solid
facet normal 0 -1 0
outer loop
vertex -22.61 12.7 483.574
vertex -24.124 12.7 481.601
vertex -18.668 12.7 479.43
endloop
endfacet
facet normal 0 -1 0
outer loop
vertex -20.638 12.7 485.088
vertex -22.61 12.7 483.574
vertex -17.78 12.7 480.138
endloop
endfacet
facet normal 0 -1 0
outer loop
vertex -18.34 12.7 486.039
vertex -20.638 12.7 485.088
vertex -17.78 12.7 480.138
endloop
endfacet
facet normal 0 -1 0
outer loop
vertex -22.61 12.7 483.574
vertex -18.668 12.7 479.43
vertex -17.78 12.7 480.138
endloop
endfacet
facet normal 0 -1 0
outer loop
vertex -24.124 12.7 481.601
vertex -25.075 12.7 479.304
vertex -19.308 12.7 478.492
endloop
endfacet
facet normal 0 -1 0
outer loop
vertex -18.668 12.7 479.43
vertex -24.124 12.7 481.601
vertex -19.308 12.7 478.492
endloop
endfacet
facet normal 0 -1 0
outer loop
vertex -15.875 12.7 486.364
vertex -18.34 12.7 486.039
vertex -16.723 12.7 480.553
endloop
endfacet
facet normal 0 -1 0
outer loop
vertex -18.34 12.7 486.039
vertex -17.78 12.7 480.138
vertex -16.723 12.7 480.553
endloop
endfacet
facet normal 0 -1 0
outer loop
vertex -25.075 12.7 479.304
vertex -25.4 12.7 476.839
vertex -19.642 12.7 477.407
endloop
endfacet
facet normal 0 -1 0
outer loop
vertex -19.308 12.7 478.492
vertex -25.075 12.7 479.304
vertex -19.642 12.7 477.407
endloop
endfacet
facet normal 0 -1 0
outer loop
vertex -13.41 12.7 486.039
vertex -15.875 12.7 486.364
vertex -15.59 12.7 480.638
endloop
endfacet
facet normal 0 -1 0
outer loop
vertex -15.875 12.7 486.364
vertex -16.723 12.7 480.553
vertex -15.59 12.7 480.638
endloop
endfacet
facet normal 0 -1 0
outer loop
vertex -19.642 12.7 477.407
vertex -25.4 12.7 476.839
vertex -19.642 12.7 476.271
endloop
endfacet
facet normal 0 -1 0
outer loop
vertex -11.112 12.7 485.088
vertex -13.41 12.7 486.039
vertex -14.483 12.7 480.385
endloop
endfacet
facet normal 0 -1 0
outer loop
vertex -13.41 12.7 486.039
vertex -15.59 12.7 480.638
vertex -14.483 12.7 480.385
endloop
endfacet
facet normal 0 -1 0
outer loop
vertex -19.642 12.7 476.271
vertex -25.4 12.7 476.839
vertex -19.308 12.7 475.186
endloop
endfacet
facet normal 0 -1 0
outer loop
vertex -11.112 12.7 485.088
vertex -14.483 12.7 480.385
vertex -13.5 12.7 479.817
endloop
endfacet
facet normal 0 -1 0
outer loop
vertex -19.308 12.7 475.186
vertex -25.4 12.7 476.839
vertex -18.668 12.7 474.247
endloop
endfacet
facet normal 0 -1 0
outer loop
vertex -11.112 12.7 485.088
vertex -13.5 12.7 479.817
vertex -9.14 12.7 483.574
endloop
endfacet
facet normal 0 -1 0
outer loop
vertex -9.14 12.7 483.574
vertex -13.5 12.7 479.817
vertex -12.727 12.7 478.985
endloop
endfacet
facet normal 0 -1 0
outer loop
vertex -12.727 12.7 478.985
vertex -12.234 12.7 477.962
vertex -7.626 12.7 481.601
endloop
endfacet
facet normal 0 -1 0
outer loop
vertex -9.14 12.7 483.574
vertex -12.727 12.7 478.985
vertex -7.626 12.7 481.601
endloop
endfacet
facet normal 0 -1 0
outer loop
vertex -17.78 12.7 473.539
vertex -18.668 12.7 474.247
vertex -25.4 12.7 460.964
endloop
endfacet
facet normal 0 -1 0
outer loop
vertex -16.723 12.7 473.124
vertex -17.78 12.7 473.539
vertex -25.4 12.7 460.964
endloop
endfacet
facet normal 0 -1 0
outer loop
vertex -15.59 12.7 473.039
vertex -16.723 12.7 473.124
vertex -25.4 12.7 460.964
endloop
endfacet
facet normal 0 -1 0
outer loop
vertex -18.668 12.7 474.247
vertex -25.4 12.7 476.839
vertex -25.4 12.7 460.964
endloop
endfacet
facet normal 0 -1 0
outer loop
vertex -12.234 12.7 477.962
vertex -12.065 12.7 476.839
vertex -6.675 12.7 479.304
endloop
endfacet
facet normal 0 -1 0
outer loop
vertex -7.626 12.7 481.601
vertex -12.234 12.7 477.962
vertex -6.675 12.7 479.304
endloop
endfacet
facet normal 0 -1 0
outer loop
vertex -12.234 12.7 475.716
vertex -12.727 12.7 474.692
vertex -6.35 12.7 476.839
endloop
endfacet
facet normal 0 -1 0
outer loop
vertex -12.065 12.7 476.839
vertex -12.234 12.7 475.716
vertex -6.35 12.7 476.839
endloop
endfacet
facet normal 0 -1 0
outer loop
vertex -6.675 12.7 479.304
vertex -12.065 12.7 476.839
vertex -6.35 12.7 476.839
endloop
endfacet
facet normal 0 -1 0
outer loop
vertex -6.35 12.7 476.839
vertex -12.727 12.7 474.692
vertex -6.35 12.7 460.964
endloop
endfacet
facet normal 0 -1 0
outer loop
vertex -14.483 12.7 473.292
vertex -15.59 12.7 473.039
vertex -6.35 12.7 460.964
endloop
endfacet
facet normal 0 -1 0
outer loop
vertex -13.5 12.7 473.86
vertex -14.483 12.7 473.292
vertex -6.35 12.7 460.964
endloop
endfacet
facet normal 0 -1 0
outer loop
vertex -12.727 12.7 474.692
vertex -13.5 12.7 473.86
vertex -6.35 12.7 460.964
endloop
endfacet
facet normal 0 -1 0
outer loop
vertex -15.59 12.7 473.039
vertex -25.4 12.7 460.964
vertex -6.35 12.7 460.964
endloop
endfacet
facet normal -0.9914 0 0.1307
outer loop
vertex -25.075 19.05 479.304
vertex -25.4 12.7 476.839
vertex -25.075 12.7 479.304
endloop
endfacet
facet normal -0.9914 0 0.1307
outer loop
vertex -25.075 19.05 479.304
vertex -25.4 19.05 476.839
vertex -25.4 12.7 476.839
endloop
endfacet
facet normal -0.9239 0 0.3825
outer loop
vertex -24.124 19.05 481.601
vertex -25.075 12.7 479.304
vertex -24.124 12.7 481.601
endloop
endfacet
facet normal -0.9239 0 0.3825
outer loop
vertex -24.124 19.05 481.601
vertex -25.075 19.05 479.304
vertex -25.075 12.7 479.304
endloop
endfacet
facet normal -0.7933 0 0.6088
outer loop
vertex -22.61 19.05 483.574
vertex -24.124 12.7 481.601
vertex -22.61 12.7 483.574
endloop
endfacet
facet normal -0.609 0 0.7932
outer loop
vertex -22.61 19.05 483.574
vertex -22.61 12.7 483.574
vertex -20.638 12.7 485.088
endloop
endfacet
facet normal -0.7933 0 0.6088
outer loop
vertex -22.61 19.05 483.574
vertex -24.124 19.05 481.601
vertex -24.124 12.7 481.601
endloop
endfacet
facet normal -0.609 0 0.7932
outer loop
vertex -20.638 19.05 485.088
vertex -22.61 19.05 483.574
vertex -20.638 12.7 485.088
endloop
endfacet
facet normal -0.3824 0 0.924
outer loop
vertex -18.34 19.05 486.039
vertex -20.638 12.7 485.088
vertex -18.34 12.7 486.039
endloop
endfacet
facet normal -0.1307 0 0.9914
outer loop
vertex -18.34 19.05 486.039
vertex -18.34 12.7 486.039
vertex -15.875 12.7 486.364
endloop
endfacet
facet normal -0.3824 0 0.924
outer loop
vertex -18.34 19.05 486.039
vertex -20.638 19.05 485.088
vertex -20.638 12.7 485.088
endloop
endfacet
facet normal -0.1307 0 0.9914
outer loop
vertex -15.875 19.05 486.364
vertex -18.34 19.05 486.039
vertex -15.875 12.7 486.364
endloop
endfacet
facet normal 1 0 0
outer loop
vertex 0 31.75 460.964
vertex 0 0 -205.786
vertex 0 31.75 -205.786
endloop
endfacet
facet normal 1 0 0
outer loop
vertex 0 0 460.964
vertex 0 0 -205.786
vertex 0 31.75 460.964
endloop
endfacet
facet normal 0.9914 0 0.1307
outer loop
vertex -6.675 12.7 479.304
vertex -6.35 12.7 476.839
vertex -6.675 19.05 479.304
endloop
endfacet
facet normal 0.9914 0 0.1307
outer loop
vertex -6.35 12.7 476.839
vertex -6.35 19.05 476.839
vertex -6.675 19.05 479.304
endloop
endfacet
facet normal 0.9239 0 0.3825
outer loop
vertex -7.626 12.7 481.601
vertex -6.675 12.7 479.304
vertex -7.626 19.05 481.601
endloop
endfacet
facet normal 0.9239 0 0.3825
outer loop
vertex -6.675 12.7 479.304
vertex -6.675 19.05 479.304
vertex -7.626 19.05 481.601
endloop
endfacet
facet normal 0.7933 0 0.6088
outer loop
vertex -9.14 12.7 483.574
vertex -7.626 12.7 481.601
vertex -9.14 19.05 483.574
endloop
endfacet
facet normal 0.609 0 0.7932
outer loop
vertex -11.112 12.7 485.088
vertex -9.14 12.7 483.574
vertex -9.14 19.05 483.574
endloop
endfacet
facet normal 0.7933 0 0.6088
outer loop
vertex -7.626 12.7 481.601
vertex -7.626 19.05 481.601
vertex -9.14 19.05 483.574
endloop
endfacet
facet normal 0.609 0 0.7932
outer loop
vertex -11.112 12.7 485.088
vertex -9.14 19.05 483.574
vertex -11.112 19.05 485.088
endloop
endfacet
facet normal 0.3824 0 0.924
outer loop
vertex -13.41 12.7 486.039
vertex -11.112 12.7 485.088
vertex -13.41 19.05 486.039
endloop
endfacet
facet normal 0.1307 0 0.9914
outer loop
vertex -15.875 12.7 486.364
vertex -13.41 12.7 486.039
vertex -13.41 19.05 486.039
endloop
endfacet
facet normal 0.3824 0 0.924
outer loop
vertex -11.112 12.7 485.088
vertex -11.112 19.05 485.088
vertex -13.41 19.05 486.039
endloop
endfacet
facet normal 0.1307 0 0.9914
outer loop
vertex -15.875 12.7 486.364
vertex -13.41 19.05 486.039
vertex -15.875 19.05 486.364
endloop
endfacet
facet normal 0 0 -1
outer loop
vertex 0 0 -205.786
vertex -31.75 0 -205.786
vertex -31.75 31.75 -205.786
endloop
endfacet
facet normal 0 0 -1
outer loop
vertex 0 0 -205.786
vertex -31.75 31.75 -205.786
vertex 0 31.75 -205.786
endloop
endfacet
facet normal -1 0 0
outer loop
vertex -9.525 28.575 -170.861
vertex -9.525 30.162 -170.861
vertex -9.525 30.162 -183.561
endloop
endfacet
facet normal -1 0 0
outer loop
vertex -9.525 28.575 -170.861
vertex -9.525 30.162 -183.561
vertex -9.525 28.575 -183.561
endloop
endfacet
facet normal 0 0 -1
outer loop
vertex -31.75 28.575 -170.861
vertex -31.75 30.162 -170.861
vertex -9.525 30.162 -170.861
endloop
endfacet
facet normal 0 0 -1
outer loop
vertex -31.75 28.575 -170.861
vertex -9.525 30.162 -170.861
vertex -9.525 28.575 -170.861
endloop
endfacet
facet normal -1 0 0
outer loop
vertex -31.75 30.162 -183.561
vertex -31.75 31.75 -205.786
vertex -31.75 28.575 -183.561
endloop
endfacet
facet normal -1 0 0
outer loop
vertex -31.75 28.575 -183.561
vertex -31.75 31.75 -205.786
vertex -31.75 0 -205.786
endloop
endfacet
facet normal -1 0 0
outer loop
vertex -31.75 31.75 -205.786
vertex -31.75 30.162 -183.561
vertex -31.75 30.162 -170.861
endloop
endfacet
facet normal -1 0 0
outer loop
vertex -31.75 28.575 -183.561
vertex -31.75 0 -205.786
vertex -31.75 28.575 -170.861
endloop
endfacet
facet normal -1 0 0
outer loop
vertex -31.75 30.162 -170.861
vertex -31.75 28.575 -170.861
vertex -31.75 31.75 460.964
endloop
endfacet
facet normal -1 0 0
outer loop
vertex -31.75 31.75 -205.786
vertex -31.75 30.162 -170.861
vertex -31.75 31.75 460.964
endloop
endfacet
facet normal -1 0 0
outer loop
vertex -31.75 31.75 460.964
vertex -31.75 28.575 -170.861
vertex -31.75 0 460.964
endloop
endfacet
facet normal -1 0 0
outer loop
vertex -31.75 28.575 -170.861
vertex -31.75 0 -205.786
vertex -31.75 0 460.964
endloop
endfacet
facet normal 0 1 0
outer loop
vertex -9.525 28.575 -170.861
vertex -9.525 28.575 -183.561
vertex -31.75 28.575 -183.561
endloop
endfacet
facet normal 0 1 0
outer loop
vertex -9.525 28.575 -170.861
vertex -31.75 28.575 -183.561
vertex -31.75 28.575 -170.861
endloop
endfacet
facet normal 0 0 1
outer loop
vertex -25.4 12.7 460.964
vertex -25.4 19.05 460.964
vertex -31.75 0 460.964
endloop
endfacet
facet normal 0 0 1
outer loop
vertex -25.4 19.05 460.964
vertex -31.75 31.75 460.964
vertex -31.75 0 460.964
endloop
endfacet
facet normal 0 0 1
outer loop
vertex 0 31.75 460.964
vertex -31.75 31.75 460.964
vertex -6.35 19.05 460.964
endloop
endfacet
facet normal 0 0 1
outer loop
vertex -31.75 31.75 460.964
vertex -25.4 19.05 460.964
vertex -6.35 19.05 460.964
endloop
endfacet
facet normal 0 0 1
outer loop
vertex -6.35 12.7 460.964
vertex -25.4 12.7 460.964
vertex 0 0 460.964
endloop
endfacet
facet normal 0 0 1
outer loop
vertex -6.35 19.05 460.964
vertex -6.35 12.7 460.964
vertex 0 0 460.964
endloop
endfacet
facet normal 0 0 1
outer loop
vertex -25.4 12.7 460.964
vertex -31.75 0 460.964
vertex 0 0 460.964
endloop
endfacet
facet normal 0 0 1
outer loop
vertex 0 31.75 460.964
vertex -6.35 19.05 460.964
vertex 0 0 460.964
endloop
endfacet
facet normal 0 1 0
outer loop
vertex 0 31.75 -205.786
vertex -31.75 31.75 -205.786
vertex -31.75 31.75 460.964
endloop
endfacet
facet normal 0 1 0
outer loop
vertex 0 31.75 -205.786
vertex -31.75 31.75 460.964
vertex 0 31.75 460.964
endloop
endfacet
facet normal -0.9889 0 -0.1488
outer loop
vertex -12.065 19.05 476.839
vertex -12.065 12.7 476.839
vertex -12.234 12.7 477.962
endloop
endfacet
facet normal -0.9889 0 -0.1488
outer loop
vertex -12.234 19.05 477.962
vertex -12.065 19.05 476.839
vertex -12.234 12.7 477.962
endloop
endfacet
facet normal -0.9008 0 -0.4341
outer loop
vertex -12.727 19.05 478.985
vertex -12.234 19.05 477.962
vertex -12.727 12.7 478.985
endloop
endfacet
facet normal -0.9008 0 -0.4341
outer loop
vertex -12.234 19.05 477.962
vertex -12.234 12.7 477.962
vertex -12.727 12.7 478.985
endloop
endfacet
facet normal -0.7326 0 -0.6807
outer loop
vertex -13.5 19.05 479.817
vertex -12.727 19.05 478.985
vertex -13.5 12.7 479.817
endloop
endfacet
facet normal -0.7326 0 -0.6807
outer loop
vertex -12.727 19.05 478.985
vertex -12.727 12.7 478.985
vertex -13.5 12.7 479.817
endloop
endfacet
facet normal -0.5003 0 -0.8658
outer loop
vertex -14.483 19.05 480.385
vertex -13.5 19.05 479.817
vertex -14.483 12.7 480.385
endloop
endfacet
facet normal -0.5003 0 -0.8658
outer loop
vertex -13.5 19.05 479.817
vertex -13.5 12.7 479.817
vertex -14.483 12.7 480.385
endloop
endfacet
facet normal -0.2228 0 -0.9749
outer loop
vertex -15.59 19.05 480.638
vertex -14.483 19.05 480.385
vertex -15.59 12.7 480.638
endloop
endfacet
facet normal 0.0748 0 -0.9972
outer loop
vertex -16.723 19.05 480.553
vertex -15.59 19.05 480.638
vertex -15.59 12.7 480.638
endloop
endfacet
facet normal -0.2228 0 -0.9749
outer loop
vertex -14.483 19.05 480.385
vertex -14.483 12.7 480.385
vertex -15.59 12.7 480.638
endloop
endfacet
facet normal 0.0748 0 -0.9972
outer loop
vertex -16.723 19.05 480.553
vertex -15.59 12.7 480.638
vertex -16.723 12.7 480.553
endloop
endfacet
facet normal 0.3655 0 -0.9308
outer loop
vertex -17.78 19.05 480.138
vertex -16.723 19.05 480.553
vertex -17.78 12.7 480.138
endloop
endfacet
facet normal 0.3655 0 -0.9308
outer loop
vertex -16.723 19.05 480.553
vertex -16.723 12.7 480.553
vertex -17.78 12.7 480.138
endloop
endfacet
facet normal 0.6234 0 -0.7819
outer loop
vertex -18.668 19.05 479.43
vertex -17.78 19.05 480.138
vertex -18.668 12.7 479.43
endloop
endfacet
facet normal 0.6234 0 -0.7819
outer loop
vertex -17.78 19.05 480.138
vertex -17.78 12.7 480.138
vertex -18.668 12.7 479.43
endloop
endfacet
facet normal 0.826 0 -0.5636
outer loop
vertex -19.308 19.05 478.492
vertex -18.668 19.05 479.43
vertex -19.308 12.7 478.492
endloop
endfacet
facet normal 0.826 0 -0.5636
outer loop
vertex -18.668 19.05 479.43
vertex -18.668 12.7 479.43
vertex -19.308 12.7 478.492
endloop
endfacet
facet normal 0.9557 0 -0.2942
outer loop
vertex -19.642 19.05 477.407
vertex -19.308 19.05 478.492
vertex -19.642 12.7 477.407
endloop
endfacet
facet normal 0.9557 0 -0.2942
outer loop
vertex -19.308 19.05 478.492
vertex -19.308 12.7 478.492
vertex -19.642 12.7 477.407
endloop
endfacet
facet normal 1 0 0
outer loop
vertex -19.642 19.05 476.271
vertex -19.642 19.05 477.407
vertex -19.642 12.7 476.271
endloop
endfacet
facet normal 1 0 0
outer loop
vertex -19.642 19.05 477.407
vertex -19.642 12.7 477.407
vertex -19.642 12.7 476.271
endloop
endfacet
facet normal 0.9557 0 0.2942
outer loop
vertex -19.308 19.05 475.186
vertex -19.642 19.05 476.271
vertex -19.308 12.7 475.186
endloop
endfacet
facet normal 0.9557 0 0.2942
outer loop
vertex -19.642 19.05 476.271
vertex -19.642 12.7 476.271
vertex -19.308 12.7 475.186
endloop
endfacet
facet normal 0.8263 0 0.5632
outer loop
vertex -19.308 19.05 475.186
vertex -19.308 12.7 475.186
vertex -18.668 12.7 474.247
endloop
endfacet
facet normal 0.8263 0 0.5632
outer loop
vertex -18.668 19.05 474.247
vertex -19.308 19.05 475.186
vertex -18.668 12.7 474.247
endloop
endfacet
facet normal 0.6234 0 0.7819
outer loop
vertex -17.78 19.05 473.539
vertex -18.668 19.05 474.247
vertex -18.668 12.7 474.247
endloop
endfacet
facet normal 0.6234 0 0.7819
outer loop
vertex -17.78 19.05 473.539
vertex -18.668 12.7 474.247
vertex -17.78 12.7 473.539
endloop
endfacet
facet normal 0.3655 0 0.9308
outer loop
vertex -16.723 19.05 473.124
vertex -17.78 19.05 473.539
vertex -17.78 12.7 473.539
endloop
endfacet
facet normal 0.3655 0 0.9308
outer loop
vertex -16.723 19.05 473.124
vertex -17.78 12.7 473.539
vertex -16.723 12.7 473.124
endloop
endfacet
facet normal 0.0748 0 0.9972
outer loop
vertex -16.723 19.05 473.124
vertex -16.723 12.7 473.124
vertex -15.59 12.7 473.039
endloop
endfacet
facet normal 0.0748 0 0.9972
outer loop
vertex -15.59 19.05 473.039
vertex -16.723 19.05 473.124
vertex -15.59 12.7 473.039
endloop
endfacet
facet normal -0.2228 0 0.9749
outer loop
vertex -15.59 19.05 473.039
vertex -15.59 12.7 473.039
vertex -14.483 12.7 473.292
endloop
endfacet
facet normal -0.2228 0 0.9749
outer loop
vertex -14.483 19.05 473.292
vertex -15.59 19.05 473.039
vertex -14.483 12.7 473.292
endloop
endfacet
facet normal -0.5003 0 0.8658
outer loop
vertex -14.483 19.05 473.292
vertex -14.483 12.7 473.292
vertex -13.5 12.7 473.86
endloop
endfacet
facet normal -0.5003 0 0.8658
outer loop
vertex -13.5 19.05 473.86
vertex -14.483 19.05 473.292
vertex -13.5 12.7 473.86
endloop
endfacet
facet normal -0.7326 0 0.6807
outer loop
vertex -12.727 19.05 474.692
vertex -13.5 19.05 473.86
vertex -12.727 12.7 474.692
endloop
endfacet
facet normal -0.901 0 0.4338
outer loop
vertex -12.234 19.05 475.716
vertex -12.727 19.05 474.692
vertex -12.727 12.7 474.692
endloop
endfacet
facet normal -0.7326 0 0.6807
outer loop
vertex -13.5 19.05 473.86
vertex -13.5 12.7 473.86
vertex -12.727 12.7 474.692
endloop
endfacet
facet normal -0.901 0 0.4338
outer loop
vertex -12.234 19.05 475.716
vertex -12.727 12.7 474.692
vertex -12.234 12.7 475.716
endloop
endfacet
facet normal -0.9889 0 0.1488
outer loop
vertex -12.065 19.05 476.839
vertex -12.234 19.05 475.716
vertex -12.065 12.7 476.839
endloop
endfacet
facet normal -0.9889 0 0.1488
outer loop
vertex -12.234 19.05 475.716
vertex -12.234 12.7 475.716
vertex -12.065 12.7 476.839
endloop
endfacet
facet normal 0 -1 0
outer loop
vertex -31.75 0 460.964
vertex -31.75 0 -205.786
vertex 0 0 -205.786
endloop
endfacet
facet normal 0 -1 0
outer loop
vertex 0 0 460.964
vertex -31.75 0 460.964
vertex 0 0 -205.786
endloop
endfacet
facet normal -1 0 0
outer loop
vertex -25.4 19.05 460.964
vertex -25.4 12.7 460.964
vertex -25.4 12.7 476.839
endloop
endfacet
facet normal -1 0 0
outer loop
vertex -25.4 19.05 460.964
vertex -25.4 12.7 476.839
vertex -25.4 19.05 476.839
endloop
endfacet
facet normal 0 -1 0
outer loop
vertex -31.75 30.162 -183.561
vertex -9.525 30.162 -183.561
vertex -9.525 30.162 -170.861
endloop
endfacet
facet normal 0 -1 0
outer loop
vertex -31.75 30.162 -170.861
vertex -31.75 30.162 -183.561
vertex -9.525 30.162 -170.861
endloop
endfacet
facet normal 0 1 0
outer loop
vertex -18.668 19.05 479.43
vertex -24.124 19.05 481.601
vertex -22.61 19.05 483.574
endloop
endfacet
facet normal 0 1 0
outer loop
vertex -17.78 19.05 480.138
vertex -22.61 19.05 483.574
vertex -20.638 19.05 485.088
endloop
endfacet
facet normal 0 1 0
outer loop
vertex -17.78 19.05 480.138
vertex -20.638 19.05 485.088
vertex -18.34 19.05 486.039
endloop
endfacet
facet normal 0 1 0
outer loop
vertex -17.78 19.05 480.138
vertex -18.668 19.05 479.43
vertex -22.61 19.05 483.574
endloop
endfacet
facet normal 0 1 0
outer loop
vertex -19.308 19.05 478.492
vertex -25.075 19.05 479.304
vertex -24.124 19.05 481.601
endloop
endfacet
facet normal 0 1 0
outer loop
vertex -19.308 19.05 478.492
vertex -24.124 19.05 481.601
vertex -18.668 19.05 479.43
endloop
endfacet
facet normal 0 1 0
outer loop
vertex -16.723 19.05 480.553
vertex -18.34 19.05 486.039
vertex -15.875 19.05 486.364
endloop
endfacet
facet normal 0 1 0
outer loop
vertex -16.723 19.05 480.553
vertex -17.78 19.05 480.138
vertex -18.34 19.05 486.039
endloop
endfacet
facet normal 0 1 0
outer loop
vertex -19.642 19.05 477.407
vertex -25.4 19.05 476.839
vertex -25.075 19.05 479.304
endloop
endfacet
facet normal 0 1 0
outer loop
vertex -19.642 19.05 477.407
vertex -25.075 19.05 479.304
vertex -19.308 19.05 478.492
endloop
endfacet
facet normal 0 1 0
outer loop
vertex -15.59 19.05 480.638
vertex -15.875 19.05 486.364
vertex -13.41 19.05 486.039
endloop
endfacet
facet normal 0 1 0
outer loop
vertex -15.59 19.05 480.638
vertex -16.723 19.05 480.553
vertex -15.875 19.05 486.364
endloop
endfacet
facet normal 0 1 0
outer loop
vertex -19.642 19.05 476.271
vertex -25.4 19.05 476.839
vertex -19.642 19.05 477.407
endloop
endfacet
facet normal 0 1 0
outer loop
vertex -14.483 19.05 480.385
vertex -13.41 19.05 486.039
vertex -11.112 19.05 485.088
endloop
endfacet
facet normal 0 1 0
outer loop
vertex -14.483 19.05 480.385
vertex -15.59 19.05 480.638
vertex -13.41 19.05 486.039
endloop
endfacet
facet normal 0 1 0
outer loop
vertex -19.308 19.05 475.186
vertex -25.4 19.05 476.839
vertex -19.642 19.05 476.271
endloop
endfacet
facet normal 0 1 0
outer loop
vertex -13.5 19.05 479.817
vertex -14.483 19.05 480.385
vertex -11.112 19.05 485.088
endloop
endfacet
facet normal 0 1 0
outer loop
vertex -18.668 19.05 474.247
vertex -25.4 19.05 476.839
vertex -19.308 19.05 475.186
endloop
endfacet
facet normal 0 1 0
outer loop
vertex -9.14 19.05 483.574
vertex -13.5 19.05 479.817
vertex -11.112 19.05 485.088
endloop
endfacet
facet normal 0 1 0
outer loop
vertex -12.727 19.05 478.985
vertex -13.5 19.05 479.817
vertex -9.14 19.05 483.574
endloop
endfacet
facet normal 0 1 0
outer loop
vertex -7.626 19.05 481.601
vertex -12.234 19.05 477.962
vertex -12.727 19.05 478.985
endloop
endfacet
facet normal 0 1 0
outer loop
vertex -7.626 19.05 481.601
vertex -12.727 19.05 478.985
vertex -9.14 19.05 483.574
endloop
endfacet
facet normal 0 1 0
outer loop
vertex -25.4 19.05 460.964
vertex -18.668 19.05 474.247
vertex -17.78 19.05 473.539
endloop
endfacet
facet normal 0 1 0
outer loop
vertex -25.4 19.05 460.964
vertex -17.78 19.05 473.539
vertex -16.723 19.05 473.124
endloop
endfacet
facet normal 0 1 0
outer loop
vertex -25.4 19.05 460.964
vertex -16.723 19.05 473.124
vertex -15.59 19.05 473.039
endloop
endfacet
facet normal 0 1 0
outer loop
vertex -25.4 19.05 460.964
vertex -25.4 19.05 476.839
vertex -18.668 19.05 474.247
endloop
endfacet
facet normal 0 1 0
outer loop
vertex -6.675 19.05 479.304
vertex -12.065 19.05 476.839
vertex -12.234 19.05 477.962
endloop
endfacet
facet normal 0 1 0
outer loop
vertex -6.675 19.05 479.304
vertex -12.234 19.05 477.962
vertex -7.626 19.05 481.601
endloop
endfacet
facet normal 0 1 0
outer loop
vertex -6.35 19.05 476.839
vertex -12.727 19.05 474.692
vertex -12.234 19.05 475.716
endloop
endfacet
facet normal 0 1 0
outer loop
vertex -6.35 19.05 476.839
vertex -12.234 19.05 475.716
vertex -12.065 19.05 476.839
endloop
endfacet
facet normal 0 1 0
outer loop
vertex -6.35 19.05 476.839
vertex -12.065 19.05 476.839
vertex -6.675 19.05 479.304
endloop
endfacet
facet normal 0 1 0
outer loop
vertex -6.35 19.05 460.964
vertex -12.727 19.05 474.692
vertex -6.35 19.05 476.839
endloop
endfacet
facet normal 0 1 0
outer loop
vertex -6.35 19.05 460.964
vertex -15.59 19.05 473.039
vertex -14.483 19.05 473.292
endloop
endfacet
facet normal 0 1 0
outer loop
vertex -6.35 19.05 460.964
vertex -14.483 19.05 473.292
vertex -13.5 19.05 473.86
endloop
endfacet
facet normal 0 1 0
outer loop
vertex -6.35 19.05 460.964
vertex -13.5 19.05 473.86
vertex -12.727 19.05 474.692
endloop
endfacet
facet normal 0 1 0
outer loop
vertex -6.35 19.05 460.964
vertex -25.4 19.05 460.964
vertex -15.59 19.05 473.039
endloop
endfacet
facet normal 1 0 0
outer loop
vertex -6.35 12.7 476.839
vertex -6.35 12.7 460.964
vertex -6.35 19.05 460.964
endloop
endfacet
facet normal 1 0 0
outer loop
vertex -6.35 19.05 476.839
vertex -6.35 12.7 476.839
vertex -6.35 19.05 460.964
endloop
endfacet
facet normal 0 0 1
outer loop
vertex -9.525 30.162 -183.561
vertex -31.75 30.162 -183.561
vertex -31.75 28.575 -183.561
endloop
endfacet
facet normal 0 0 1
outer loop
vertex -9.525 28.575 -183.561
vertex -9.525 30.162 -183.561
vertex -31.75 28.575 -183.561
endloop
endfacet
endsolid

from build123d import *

# Parameters (mm, degrees)
F0_W     = 31.75
F0_H     = 666.75
F1_DEPTH = 31.75
F2_W     = 19.05
F2_H     = 6.35
F3_DEPTH = 25.4
F4_R     = 9.52499
F5_R     = 3.81
F6_DEPTH = 6.35
F7_W     = 1.5875
F7_H     = 12.7
F8_DEPTH = 22.225


# Not quite as in the source:
# - a fillet or chamfer is up to 0.001 mm smaller than in the source, because OpenCascade refuses the exact size


with BuildPart() as f1:
    # F0 (on Front) → F1 (new body)
    with BuildSketch(Plane.XZ):
        with Locations((-15.875, 127.5886728781)):
            Rectangle(F0_W, F0_H)
    extrude(amount=-F1_DEPTH)

    # F2 (on face) → F3 (join)
    with BuildSketch(Plane.XY.offset(460.9636728781)):
        with Locations((-15.875, 15.875)):
            Rectangle(F2_W, F2_H)
    extrude(amount=F3_DEPTH)

    # F4 (radius 9.525 in the source; OpenCascade refuses exactly that, so slightly less here)
    f4_edges = [f1.edges().sort_by_distance(p)[0] for p in [
        (-6.35, 15.875, 486.363673),
        (-25.4, 15.875, 486.363673),
    ]]
    fillet(f4_edges, radius=F4_R)

    # F5 (on face) → F6 (cut)
    with BuildSketch(Plane.XZ.offset(-12.7)):
        with Locations((-15.875, 476.8386728781)):
            Circle(F5_R)
    extrude(amount=-F6_DEPTH, mode=Mode.SUBTRACT)

    # F7 (on face) → F8 (cut)
    with BuildSketch(Plane(origin=(-31.75, 0, 0), x_dir=(0, -1, 0), z_dir=(-1, 0, 0))):
        with Locations((-29.36875, -177.2113271219)):
            Rectangle(F7_W, F7_H)
    extrude(amount=-F8_DEPTH, mode=Mode.SUBTRACT)


solid = f1.part
